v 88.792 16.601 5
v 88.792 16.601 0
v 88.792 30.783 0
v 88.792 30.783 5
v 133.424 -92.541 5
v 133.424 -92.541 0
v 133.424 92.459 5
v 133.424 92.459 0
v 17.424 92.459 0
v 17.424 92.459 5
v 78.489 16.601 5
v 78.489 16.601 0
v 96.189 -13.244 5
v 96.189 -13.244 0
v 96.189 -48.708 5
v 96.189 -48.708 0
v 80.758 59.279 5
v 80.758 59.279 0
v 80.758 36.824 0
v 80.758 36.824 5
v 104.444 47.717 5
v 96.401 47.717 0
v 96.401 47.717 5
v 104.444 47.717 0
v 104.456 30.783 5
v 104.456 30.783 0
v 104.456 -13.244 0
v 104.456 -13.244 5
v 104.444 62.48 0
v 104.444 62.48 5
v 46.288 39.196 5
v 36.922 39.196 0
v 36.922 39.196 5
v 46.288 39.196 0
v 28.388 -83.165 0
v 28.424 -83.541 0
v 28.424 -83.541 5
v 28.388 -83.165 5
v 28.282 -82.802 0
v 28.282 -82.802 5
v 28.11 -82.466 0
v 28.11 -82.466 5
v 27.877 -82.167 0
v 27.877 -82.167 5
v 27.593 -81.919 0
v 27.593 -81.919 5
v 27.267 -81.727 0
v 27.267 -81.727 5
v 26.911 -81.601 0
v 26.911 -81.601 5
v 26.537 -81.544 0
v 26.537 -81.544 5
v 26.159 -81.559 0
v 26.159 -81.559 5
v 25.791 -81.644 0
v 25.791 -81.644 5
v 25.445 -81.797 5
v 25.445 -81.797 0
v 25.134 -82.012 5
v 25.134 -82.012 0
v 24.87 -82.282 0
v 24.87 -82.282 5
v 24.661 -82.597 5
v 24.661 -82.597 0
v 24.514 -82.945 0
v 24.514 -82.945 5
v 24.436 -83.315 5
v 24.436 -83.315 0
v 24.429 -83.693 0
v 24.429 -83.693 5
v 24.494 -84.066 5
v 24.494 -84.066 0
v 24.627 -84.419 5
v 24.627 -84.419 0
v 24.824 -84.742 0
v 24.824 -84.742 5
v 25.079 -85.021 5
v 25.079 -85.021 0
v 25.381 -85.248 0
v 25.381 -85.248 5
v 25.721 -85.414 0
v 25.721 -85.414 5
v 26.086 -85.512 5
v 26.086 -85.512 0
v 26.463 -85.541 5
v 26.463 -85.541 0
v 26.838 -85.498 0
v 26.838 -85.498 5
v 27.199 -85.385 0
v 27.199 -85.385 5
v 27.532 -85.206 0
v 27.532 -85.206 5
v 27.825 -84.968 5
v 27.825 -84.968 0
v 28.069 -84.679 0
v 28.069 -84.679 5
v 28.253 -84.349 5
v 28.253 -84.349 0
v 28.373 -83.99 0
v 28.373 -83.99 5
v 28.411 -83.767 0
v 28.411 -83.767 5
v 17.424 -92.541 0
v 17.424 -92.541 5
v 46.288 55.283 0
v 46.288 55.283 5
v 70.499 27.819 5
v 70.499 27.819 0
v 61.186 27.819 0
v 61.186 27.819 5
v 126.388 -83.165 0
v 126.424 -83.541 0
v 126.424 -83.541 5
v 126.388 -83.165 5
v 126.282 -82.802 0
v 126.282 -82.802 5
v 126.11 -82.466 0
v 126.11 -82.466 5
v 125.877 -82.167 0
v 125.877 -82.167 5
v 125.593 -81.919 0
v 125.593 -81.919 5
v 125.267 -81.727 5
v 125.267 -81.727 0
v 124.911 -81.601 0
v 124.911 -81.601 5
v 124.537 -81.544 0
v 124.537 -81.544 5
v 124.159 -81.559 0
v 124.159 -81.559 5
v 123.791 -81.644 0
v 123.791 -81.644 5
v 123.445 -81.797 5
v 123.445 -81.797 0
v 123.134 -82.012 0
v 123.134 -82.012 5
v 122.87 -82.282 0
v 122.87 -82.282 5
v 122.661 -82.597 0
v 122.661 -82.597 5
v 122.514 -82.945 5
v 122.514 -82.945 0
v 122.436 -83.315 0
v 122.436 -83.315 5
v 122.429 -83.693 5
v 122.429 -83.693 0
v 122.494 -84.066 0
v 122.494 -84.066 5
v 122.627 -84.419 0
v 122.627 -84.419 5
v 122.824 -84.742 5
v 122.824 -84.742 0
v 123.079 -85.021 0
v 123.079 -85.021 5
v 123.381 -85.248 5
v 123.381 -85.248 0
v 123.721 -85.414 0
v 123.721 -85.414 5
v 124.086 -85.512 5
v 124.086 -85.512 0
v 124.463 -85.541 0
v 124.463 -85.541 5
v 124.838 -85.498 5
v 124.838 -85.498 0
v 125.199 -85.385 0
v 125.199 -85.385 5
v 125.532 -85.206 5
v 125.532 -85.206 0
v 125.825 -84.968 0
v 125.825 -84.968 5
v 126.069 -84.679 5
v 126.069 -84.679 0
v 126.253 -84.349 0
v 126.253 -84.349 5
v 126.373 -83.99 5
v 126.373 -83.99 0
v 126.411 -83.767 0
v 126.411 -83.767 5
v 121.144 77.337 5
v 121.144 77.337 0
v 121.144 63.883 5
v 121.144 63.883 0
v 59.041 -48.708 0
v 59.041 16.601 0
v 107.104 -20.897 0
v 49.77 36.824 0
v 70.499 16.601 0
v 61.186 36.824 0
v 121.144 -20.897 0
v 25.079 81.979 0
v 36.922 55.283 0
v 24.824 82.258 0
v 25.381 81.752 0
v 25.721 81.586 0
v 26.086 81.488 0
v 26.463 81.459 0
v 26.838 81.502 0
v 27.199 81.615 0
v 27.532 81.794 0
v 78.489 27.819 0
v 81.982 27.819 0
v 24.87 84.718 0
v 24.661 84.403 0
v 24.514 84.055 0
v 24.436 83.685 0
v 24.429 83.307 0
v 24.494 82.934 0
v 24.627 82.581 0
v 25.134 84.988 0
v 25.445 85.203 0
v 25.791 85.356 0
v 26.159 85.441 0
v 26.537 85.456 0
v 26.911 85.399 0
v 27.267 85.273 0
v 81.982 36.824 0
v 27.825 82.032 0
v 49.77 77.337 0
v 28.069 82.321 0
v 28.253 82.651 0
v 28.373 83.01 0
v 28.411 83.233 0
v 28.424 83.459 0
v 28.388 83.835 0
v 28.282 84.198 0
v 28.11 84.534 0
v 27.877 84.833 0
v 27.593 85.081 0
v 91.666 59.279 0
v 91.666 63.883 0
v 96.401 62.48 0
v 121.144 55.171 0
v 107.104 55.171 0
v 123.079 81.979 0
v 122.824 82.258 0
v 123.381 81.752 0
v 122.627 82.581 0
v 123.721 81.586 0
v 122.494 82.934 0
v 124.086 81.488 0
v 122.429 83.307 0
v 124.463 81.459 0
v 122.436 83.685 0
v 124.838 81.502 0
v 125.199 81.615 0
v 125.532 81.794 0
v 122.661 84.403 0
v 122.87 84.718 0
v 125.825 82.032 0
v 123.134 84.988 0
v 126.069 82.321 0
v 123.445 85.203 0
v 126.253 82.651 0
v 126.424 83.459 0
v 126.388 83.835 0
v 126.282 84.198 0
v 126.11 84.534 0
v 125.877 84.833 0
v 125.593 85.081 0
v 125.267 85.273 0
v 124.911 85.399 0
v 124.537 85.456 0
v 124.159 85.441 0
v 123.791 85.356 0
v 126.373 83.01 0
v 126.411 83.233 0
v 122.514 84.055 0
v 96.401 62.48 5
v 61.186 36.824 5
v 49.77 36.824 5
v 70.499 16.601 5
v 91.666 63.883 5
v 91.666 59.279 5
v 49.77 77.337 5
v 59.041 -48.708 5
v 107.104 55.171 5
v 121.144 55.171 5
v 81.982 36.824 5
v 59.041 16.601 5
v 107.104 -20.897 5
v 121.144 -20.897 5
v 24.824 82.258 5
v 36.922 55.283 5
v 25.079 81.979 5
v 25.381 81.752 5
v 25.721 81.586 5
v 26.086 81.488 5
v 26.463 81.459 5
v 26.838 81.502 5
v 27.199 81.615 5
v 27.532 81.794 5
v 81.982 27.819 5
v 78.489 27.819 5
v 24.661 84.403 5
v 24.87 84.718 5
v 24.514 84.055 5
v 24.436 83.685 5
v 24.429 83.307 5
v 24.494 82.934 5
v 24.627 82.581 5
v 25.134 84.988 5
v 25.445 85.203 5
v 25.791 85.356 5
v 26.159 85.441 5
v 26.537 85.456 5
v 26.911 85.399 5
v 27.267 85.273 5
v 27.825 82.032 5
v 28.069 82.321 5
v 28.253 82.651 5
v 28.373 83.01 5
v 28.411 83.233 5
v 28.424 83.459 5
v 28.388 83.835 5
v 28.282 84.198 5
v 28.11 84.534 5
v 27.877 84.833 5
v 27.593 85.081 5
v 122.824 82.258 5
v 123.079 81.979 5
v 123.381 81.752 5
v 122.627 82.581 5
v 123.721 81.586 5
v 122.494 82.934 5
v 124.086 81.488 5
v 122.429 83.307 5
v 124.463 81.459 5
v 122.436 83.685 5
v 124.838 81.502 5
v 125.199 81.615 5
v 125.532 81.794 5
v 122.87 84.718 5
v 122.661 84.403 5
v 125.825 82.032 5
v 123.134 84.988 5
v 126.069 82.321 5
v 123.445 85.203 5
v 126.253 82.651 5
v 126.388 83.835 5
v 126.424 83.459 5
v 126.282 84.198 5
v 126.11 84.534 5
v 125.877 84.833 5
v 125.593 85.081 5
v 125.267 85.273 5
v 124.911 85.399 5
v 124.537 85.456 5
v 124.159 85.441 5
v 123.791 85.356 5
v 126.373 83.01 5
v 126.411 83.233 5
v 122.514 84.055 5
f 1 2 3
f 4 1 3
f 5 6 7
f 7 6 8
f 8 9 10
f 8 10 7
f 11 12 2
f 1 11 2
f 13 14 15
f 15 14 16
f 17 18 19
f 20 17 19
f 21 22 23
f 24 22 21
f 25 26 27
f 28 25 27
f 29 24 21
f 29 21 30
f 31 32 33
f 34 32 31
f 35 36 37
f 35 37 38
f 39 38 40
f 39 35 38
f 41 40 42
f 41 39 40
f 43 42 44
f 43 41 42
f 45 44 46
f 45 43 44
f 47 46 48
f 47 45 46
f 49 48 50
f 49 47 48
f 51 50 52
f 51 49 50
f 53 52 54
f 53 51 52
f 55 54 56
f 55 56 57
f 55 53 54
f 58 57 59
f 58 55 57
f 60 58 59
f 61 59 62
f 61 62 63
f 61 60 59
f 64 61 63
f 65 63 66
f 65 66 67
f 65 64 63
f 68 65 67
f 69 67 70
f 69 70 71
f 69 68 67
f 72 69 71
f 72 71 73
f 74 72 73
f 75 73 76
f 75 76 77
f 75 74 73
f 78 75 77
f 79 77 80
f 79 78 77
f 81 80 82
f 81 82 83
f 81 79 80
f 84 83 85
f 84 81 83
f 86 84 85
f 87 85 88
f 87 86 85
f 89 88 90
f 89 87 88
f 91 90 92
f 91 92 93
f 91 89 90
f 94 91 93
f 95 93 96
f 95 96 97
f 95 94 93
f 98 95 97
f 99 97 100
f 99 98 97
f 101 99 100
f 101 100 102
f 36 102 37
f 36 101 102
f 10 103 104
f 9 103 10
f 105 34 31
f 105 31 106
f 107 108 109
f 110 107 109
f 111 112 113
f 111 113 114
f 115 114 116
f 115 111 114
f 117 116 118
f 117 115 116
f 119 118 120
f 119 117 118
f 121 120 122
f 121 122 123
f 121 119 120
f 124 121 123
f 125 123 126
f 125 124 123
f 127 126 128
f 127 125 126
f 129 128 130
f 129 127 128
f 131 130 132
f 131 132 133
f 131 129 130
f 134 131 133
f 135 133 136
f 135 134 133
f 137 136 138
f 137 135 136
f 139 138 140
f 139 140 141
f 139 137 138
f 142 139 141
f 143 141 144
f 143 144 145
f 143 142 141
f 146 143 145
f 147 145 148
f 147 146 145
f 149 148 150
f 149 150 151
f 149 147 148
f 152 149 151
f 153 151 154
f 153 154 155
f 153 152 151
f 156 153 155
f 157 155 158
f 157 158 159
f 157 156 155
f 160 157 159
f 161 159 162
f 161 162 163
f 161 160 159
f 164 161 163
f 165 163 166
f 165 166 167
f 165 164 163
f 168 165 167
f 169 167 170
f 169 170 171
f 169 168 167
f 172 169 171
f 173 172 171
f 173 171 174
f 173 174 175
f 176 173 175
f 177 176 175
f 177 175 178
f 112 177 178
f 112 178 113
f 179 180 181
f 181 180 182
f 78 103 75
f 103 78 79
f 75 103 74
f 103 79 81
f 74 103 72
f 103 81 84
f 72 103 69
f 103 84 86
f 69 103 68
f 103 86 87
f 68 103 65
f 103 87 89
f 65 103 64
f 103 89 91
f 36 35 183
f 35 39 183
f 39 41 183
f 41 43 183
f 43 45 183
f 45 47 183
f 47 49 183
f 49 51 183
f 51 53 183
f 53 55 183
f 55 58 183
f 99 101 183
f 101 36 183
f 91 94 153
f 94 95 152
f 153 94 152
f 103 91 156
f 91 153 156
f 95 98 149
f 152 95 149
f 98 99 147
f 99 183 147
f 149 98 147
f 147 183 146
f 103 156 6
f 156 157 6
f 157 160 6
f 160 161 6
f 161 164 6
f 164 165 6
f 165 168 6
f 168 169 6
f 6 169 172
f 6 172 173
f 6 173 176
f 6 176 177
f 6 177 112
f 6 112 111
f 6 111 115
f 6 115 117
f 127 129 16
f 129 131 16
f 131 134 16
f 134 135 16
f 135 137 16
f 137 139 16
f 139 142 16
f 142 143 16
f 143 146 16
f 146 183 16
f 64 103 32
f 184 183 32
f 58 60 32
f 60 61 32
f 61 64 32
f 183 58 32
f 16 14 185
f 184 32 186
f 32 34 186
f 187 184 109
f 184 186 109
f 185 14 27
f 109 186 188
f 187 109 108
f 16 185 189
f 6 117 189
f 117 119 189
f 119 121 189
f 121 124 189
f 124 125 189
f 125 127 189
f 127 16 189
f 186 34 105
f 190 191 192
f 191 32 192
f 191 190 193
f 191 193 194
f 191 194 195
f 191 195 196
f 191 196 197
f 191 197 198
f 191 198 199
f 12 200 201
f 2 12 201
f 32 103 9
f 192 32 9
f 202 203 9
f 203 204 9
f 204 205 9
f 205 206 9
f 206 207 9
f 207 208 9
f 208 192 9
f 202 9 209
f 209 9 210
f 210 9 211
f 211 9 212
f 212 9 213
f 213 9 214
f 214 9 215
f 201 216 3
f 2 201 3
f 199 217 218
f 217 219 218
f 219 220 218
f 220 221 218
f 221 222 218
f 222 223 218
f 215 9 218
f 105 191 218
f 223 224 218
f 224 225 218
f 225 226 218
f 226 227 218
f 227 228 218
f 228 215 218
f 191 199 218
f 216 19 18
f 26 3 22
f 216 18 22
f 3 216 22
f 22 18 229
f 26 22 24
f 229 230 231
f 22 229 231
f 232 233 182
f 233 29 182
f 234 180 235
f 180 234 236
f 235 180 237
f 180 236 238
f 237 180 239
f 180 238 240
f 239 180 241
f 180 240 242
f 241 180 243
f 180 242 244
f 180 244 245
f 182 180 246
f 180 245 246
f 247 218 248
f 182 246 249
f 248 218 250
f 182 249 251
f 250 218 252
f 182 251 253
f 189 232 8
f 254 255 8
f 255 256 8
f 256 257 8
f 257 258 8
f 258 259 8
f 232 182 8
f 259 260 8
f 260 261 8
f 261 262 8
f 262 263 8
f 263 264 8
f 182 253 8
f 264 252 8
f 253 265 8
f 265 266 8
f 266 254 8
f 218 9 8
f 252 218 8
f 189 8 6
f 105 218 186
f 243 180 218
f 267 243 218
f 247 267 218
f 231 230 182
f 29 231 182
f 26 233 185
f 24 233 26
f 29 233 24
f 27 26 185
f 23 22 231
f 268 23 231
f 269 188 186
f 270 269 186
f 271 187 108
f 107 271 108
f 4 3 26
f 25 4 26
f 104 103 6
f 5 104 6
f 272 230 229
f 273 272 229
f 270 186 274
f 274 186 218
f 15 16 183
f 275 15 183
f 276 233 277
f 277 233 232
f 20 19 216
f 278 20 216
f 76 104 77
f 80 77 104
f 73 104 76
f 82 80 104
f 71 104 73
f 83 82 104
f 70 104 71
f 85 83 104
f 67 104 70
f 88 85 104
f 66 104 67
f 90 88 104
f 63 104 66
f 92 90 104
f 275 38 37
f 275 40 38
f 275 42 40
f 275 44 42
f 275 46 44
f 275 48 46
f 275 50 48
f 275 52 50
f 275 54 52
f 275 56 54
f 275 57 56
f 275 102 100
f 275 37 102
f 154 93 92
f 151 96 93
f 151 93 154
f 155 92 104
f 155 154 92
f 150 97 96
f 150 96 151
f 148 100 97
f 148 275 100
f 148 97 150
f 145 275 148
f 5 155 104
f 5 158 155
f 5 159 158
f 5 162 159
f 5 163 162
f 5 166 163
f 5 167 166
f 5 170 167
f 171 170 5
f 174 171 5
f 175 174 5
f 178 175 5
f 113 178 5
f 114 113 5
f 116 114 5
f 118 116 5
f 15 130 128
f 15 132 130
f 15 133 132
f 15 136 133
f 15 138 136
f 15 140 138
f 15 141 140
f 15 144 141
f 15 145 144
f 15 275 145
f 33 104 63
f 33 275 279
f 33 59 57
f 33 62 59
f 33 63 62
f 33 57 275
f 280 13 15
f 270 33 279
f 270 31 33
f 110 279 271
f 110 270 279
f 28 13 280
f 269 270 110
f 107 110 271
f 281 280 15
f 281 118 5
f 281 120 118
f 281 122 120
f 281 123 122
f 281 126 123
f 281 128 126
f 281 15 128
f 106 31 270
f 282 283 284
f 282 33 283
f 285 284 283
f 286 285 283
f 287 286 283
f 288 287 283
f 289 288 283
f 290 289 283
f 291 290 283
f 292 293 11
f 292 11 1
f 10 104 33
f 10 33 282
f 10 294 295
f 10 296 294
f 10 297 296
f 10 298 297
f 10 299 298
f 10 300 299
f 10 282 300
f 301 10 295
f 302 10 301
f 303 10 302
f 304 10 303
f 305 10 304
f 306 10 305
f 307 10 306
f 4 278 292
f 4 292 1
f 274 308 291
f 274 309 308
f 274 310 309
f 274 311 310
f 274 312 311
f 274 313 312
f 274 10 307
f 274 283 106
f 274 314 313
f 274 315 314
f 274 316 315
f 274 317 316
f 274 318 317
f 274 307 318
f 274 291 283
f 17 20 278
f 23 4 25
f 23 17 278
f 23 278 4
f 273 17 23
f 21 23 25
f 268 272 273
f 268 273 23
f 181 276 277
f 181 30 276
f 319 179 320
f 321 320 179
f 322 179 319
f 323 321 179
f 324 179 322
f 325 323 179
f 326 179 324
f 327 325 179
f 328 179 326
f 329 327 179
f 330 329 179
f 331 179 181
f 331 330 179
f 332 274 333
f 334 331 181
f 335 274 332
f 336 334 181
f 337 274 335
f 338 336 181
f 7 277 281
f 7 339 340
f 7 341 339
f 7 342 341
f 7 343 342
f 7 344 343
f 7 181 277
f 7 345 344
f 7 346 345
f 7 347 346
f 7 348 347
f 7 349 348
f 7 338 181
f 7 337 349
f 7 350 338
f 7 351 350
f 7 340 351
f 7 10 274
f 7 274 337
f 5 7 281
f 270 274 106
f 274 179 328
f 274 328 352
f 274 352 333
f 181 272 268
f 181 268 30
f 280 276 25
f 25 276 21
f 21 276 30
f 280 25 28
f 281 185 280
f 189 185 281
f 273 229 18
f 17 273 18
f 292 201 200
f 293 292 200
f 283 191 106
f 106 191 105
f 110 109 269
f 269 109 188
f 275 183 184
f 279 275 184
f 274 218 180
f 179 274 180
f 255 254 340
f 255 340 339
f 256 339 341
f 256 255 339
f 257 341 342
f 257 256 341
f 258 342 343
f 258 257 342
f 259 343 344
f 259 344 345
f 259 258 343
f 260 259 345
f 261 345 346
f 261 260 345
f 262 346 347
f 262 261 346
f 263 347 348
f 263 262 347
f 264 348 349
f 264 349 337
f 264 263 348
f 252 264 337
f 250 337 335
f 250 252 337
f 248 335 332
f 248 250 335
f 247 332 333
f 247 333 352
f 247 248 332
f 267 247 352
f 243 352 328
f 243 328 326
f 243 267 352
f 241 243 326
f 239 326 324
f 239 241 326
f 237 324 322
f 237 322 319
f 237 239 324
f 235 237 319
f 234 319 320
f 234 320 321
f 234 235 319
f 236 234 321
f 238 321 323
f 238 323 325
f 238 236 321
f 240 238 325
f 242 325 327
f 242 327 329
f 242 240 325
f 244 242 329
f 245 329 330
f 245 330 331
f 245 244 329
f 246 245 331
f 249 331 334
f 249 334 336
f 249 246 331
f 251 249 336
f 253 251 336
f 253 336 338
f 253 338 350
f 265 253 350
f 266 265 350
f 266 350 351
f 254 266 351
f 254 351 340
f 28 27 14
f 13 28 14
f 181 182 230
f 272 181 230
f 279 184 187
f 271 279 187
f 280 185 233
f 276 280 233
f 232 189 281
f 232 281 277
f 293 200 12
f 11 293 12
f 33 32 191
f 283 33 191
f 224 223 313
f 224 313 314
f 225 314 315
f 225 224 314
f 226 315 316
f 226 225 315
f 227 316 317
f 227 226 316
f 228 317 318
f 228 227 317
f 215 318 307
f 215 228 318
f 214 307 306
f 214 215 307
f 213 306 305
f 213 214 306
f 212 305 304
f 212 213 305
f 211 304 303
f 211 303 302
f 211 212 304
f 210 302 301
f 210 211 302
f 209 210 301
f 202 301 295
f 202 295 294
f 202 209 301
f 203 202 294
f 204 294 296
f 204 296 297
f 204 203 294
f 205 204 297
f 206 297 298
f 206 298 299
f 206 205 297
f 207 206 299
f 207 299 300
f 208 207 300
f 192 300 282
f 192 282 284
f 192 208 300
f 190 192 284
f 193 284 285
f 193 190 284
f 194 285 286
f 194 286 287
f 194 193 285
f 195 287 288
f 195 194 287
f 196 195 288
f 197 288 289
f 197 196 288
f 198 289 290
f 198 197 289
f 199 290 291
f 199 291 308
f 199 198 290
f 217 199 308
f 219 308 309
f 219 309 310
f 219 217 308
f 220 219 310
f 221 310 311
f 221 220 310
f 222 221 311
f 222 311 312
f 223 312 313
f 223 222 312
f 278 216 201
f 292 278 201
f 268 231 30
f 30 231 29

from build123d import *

# Parameters (mm, degrees)
SKETCH9_W           = 116
SKETCH9_H           = 185
SKETCH9_RX          = 2.0001
SKETCH9_RY          = 2
SKETCH9_W_2         = 14.0398
SKETCH9_H_2         = 76.0678
SKETCH9_W_3         = 8.0434
SKETCH9_H_3         = 14.7638
SKETCH9_W_4         = 9.3662
SKETCH9_H_4         = 16.0866
BOSS_EXTRUDE3_DEPTH = 5


with BuildPart() as part:
    # Sketch9 → Boss-Extrude3 (new body)
    with BuildSketch(Plane.XY):
        with Locations((75.4236, -0.0411)):
            Rectangle(SKETCH9_W, SKETCH9_H)
        with Locations((26.4237, 83.4589)):
            Ellipse(SKETCH9_RX, SKETCH9_RY, mode=Mode.SUBTRACT)
        with Locations((124.4237, 83.4589)):
            Ellipse(SKETCH9_RX, SKETCH9_RY, mode=Mode.SUBTRACT)
        with Locations((124.4237, -83.5411)):
            Ellipse(SKETCH9_RX, SKETCH9_RY, mode=Mode.SUBTRACT)
        with Locations((26.4237, -83.5411)):
            Ellipse(SKETCH9_RX, SKETCH9_RY, mode=Mode.SUBTRACT)
        with Locations((114.1237, 17.1372)):
            Rectangle(SKETCH9_W_2, SKETCH9_H_2, mode=Mode.SUBTRACT)
        with Locations((100.4225, 55.0986)):
            Rectangle(SKETCH9_W_3, SKETCH9_H_3, mode=Mode.SUBTRACT)
        Polygon((88.7925, 30.7834), (104.4559, 30.7834), (104.4559, 16.0196), (104.4559, -13.2439), (96.1886, -13.2439), (96.1886, -28.708), (96.1886, -48.708), (59.0411, -48.708), (59.0411, -28.708), (59.0411, 16.6008), (70.4989, 16.6008), (70.4989, 27.8192), (61.1857, 27.8192), (61.1857, 28.9577), (61.1857, 36.8241), (49.7696, 36.8241), (49.7696, 77.3371), (80.7576, 77.3371), (91.6664, 77.3371), (121.1436, 77.3371), (121.1436, 63.8829), (91.6664, 63.8829), (91.6664, 59.2791), (80.7576, 59.2791), (80.7576, 36.8241), (81.982, 36.8241), (81.982, 28.9577), (81.982, 27.8192), (78.4893, 27.8192), (78.4893, 16.6008), (88.7925, 16.6008), align=None, mode=Mode.SUBTRACT)
        with Locations((41.6049, 47.2397)):
            Rectangle(SKETCH9_W_4, SKETCH9_H_4, mode=Mode.SUBTRACT)
    extrude(amount=BOSS_EXTRUDE3_DEPTH)


solid = part.part
